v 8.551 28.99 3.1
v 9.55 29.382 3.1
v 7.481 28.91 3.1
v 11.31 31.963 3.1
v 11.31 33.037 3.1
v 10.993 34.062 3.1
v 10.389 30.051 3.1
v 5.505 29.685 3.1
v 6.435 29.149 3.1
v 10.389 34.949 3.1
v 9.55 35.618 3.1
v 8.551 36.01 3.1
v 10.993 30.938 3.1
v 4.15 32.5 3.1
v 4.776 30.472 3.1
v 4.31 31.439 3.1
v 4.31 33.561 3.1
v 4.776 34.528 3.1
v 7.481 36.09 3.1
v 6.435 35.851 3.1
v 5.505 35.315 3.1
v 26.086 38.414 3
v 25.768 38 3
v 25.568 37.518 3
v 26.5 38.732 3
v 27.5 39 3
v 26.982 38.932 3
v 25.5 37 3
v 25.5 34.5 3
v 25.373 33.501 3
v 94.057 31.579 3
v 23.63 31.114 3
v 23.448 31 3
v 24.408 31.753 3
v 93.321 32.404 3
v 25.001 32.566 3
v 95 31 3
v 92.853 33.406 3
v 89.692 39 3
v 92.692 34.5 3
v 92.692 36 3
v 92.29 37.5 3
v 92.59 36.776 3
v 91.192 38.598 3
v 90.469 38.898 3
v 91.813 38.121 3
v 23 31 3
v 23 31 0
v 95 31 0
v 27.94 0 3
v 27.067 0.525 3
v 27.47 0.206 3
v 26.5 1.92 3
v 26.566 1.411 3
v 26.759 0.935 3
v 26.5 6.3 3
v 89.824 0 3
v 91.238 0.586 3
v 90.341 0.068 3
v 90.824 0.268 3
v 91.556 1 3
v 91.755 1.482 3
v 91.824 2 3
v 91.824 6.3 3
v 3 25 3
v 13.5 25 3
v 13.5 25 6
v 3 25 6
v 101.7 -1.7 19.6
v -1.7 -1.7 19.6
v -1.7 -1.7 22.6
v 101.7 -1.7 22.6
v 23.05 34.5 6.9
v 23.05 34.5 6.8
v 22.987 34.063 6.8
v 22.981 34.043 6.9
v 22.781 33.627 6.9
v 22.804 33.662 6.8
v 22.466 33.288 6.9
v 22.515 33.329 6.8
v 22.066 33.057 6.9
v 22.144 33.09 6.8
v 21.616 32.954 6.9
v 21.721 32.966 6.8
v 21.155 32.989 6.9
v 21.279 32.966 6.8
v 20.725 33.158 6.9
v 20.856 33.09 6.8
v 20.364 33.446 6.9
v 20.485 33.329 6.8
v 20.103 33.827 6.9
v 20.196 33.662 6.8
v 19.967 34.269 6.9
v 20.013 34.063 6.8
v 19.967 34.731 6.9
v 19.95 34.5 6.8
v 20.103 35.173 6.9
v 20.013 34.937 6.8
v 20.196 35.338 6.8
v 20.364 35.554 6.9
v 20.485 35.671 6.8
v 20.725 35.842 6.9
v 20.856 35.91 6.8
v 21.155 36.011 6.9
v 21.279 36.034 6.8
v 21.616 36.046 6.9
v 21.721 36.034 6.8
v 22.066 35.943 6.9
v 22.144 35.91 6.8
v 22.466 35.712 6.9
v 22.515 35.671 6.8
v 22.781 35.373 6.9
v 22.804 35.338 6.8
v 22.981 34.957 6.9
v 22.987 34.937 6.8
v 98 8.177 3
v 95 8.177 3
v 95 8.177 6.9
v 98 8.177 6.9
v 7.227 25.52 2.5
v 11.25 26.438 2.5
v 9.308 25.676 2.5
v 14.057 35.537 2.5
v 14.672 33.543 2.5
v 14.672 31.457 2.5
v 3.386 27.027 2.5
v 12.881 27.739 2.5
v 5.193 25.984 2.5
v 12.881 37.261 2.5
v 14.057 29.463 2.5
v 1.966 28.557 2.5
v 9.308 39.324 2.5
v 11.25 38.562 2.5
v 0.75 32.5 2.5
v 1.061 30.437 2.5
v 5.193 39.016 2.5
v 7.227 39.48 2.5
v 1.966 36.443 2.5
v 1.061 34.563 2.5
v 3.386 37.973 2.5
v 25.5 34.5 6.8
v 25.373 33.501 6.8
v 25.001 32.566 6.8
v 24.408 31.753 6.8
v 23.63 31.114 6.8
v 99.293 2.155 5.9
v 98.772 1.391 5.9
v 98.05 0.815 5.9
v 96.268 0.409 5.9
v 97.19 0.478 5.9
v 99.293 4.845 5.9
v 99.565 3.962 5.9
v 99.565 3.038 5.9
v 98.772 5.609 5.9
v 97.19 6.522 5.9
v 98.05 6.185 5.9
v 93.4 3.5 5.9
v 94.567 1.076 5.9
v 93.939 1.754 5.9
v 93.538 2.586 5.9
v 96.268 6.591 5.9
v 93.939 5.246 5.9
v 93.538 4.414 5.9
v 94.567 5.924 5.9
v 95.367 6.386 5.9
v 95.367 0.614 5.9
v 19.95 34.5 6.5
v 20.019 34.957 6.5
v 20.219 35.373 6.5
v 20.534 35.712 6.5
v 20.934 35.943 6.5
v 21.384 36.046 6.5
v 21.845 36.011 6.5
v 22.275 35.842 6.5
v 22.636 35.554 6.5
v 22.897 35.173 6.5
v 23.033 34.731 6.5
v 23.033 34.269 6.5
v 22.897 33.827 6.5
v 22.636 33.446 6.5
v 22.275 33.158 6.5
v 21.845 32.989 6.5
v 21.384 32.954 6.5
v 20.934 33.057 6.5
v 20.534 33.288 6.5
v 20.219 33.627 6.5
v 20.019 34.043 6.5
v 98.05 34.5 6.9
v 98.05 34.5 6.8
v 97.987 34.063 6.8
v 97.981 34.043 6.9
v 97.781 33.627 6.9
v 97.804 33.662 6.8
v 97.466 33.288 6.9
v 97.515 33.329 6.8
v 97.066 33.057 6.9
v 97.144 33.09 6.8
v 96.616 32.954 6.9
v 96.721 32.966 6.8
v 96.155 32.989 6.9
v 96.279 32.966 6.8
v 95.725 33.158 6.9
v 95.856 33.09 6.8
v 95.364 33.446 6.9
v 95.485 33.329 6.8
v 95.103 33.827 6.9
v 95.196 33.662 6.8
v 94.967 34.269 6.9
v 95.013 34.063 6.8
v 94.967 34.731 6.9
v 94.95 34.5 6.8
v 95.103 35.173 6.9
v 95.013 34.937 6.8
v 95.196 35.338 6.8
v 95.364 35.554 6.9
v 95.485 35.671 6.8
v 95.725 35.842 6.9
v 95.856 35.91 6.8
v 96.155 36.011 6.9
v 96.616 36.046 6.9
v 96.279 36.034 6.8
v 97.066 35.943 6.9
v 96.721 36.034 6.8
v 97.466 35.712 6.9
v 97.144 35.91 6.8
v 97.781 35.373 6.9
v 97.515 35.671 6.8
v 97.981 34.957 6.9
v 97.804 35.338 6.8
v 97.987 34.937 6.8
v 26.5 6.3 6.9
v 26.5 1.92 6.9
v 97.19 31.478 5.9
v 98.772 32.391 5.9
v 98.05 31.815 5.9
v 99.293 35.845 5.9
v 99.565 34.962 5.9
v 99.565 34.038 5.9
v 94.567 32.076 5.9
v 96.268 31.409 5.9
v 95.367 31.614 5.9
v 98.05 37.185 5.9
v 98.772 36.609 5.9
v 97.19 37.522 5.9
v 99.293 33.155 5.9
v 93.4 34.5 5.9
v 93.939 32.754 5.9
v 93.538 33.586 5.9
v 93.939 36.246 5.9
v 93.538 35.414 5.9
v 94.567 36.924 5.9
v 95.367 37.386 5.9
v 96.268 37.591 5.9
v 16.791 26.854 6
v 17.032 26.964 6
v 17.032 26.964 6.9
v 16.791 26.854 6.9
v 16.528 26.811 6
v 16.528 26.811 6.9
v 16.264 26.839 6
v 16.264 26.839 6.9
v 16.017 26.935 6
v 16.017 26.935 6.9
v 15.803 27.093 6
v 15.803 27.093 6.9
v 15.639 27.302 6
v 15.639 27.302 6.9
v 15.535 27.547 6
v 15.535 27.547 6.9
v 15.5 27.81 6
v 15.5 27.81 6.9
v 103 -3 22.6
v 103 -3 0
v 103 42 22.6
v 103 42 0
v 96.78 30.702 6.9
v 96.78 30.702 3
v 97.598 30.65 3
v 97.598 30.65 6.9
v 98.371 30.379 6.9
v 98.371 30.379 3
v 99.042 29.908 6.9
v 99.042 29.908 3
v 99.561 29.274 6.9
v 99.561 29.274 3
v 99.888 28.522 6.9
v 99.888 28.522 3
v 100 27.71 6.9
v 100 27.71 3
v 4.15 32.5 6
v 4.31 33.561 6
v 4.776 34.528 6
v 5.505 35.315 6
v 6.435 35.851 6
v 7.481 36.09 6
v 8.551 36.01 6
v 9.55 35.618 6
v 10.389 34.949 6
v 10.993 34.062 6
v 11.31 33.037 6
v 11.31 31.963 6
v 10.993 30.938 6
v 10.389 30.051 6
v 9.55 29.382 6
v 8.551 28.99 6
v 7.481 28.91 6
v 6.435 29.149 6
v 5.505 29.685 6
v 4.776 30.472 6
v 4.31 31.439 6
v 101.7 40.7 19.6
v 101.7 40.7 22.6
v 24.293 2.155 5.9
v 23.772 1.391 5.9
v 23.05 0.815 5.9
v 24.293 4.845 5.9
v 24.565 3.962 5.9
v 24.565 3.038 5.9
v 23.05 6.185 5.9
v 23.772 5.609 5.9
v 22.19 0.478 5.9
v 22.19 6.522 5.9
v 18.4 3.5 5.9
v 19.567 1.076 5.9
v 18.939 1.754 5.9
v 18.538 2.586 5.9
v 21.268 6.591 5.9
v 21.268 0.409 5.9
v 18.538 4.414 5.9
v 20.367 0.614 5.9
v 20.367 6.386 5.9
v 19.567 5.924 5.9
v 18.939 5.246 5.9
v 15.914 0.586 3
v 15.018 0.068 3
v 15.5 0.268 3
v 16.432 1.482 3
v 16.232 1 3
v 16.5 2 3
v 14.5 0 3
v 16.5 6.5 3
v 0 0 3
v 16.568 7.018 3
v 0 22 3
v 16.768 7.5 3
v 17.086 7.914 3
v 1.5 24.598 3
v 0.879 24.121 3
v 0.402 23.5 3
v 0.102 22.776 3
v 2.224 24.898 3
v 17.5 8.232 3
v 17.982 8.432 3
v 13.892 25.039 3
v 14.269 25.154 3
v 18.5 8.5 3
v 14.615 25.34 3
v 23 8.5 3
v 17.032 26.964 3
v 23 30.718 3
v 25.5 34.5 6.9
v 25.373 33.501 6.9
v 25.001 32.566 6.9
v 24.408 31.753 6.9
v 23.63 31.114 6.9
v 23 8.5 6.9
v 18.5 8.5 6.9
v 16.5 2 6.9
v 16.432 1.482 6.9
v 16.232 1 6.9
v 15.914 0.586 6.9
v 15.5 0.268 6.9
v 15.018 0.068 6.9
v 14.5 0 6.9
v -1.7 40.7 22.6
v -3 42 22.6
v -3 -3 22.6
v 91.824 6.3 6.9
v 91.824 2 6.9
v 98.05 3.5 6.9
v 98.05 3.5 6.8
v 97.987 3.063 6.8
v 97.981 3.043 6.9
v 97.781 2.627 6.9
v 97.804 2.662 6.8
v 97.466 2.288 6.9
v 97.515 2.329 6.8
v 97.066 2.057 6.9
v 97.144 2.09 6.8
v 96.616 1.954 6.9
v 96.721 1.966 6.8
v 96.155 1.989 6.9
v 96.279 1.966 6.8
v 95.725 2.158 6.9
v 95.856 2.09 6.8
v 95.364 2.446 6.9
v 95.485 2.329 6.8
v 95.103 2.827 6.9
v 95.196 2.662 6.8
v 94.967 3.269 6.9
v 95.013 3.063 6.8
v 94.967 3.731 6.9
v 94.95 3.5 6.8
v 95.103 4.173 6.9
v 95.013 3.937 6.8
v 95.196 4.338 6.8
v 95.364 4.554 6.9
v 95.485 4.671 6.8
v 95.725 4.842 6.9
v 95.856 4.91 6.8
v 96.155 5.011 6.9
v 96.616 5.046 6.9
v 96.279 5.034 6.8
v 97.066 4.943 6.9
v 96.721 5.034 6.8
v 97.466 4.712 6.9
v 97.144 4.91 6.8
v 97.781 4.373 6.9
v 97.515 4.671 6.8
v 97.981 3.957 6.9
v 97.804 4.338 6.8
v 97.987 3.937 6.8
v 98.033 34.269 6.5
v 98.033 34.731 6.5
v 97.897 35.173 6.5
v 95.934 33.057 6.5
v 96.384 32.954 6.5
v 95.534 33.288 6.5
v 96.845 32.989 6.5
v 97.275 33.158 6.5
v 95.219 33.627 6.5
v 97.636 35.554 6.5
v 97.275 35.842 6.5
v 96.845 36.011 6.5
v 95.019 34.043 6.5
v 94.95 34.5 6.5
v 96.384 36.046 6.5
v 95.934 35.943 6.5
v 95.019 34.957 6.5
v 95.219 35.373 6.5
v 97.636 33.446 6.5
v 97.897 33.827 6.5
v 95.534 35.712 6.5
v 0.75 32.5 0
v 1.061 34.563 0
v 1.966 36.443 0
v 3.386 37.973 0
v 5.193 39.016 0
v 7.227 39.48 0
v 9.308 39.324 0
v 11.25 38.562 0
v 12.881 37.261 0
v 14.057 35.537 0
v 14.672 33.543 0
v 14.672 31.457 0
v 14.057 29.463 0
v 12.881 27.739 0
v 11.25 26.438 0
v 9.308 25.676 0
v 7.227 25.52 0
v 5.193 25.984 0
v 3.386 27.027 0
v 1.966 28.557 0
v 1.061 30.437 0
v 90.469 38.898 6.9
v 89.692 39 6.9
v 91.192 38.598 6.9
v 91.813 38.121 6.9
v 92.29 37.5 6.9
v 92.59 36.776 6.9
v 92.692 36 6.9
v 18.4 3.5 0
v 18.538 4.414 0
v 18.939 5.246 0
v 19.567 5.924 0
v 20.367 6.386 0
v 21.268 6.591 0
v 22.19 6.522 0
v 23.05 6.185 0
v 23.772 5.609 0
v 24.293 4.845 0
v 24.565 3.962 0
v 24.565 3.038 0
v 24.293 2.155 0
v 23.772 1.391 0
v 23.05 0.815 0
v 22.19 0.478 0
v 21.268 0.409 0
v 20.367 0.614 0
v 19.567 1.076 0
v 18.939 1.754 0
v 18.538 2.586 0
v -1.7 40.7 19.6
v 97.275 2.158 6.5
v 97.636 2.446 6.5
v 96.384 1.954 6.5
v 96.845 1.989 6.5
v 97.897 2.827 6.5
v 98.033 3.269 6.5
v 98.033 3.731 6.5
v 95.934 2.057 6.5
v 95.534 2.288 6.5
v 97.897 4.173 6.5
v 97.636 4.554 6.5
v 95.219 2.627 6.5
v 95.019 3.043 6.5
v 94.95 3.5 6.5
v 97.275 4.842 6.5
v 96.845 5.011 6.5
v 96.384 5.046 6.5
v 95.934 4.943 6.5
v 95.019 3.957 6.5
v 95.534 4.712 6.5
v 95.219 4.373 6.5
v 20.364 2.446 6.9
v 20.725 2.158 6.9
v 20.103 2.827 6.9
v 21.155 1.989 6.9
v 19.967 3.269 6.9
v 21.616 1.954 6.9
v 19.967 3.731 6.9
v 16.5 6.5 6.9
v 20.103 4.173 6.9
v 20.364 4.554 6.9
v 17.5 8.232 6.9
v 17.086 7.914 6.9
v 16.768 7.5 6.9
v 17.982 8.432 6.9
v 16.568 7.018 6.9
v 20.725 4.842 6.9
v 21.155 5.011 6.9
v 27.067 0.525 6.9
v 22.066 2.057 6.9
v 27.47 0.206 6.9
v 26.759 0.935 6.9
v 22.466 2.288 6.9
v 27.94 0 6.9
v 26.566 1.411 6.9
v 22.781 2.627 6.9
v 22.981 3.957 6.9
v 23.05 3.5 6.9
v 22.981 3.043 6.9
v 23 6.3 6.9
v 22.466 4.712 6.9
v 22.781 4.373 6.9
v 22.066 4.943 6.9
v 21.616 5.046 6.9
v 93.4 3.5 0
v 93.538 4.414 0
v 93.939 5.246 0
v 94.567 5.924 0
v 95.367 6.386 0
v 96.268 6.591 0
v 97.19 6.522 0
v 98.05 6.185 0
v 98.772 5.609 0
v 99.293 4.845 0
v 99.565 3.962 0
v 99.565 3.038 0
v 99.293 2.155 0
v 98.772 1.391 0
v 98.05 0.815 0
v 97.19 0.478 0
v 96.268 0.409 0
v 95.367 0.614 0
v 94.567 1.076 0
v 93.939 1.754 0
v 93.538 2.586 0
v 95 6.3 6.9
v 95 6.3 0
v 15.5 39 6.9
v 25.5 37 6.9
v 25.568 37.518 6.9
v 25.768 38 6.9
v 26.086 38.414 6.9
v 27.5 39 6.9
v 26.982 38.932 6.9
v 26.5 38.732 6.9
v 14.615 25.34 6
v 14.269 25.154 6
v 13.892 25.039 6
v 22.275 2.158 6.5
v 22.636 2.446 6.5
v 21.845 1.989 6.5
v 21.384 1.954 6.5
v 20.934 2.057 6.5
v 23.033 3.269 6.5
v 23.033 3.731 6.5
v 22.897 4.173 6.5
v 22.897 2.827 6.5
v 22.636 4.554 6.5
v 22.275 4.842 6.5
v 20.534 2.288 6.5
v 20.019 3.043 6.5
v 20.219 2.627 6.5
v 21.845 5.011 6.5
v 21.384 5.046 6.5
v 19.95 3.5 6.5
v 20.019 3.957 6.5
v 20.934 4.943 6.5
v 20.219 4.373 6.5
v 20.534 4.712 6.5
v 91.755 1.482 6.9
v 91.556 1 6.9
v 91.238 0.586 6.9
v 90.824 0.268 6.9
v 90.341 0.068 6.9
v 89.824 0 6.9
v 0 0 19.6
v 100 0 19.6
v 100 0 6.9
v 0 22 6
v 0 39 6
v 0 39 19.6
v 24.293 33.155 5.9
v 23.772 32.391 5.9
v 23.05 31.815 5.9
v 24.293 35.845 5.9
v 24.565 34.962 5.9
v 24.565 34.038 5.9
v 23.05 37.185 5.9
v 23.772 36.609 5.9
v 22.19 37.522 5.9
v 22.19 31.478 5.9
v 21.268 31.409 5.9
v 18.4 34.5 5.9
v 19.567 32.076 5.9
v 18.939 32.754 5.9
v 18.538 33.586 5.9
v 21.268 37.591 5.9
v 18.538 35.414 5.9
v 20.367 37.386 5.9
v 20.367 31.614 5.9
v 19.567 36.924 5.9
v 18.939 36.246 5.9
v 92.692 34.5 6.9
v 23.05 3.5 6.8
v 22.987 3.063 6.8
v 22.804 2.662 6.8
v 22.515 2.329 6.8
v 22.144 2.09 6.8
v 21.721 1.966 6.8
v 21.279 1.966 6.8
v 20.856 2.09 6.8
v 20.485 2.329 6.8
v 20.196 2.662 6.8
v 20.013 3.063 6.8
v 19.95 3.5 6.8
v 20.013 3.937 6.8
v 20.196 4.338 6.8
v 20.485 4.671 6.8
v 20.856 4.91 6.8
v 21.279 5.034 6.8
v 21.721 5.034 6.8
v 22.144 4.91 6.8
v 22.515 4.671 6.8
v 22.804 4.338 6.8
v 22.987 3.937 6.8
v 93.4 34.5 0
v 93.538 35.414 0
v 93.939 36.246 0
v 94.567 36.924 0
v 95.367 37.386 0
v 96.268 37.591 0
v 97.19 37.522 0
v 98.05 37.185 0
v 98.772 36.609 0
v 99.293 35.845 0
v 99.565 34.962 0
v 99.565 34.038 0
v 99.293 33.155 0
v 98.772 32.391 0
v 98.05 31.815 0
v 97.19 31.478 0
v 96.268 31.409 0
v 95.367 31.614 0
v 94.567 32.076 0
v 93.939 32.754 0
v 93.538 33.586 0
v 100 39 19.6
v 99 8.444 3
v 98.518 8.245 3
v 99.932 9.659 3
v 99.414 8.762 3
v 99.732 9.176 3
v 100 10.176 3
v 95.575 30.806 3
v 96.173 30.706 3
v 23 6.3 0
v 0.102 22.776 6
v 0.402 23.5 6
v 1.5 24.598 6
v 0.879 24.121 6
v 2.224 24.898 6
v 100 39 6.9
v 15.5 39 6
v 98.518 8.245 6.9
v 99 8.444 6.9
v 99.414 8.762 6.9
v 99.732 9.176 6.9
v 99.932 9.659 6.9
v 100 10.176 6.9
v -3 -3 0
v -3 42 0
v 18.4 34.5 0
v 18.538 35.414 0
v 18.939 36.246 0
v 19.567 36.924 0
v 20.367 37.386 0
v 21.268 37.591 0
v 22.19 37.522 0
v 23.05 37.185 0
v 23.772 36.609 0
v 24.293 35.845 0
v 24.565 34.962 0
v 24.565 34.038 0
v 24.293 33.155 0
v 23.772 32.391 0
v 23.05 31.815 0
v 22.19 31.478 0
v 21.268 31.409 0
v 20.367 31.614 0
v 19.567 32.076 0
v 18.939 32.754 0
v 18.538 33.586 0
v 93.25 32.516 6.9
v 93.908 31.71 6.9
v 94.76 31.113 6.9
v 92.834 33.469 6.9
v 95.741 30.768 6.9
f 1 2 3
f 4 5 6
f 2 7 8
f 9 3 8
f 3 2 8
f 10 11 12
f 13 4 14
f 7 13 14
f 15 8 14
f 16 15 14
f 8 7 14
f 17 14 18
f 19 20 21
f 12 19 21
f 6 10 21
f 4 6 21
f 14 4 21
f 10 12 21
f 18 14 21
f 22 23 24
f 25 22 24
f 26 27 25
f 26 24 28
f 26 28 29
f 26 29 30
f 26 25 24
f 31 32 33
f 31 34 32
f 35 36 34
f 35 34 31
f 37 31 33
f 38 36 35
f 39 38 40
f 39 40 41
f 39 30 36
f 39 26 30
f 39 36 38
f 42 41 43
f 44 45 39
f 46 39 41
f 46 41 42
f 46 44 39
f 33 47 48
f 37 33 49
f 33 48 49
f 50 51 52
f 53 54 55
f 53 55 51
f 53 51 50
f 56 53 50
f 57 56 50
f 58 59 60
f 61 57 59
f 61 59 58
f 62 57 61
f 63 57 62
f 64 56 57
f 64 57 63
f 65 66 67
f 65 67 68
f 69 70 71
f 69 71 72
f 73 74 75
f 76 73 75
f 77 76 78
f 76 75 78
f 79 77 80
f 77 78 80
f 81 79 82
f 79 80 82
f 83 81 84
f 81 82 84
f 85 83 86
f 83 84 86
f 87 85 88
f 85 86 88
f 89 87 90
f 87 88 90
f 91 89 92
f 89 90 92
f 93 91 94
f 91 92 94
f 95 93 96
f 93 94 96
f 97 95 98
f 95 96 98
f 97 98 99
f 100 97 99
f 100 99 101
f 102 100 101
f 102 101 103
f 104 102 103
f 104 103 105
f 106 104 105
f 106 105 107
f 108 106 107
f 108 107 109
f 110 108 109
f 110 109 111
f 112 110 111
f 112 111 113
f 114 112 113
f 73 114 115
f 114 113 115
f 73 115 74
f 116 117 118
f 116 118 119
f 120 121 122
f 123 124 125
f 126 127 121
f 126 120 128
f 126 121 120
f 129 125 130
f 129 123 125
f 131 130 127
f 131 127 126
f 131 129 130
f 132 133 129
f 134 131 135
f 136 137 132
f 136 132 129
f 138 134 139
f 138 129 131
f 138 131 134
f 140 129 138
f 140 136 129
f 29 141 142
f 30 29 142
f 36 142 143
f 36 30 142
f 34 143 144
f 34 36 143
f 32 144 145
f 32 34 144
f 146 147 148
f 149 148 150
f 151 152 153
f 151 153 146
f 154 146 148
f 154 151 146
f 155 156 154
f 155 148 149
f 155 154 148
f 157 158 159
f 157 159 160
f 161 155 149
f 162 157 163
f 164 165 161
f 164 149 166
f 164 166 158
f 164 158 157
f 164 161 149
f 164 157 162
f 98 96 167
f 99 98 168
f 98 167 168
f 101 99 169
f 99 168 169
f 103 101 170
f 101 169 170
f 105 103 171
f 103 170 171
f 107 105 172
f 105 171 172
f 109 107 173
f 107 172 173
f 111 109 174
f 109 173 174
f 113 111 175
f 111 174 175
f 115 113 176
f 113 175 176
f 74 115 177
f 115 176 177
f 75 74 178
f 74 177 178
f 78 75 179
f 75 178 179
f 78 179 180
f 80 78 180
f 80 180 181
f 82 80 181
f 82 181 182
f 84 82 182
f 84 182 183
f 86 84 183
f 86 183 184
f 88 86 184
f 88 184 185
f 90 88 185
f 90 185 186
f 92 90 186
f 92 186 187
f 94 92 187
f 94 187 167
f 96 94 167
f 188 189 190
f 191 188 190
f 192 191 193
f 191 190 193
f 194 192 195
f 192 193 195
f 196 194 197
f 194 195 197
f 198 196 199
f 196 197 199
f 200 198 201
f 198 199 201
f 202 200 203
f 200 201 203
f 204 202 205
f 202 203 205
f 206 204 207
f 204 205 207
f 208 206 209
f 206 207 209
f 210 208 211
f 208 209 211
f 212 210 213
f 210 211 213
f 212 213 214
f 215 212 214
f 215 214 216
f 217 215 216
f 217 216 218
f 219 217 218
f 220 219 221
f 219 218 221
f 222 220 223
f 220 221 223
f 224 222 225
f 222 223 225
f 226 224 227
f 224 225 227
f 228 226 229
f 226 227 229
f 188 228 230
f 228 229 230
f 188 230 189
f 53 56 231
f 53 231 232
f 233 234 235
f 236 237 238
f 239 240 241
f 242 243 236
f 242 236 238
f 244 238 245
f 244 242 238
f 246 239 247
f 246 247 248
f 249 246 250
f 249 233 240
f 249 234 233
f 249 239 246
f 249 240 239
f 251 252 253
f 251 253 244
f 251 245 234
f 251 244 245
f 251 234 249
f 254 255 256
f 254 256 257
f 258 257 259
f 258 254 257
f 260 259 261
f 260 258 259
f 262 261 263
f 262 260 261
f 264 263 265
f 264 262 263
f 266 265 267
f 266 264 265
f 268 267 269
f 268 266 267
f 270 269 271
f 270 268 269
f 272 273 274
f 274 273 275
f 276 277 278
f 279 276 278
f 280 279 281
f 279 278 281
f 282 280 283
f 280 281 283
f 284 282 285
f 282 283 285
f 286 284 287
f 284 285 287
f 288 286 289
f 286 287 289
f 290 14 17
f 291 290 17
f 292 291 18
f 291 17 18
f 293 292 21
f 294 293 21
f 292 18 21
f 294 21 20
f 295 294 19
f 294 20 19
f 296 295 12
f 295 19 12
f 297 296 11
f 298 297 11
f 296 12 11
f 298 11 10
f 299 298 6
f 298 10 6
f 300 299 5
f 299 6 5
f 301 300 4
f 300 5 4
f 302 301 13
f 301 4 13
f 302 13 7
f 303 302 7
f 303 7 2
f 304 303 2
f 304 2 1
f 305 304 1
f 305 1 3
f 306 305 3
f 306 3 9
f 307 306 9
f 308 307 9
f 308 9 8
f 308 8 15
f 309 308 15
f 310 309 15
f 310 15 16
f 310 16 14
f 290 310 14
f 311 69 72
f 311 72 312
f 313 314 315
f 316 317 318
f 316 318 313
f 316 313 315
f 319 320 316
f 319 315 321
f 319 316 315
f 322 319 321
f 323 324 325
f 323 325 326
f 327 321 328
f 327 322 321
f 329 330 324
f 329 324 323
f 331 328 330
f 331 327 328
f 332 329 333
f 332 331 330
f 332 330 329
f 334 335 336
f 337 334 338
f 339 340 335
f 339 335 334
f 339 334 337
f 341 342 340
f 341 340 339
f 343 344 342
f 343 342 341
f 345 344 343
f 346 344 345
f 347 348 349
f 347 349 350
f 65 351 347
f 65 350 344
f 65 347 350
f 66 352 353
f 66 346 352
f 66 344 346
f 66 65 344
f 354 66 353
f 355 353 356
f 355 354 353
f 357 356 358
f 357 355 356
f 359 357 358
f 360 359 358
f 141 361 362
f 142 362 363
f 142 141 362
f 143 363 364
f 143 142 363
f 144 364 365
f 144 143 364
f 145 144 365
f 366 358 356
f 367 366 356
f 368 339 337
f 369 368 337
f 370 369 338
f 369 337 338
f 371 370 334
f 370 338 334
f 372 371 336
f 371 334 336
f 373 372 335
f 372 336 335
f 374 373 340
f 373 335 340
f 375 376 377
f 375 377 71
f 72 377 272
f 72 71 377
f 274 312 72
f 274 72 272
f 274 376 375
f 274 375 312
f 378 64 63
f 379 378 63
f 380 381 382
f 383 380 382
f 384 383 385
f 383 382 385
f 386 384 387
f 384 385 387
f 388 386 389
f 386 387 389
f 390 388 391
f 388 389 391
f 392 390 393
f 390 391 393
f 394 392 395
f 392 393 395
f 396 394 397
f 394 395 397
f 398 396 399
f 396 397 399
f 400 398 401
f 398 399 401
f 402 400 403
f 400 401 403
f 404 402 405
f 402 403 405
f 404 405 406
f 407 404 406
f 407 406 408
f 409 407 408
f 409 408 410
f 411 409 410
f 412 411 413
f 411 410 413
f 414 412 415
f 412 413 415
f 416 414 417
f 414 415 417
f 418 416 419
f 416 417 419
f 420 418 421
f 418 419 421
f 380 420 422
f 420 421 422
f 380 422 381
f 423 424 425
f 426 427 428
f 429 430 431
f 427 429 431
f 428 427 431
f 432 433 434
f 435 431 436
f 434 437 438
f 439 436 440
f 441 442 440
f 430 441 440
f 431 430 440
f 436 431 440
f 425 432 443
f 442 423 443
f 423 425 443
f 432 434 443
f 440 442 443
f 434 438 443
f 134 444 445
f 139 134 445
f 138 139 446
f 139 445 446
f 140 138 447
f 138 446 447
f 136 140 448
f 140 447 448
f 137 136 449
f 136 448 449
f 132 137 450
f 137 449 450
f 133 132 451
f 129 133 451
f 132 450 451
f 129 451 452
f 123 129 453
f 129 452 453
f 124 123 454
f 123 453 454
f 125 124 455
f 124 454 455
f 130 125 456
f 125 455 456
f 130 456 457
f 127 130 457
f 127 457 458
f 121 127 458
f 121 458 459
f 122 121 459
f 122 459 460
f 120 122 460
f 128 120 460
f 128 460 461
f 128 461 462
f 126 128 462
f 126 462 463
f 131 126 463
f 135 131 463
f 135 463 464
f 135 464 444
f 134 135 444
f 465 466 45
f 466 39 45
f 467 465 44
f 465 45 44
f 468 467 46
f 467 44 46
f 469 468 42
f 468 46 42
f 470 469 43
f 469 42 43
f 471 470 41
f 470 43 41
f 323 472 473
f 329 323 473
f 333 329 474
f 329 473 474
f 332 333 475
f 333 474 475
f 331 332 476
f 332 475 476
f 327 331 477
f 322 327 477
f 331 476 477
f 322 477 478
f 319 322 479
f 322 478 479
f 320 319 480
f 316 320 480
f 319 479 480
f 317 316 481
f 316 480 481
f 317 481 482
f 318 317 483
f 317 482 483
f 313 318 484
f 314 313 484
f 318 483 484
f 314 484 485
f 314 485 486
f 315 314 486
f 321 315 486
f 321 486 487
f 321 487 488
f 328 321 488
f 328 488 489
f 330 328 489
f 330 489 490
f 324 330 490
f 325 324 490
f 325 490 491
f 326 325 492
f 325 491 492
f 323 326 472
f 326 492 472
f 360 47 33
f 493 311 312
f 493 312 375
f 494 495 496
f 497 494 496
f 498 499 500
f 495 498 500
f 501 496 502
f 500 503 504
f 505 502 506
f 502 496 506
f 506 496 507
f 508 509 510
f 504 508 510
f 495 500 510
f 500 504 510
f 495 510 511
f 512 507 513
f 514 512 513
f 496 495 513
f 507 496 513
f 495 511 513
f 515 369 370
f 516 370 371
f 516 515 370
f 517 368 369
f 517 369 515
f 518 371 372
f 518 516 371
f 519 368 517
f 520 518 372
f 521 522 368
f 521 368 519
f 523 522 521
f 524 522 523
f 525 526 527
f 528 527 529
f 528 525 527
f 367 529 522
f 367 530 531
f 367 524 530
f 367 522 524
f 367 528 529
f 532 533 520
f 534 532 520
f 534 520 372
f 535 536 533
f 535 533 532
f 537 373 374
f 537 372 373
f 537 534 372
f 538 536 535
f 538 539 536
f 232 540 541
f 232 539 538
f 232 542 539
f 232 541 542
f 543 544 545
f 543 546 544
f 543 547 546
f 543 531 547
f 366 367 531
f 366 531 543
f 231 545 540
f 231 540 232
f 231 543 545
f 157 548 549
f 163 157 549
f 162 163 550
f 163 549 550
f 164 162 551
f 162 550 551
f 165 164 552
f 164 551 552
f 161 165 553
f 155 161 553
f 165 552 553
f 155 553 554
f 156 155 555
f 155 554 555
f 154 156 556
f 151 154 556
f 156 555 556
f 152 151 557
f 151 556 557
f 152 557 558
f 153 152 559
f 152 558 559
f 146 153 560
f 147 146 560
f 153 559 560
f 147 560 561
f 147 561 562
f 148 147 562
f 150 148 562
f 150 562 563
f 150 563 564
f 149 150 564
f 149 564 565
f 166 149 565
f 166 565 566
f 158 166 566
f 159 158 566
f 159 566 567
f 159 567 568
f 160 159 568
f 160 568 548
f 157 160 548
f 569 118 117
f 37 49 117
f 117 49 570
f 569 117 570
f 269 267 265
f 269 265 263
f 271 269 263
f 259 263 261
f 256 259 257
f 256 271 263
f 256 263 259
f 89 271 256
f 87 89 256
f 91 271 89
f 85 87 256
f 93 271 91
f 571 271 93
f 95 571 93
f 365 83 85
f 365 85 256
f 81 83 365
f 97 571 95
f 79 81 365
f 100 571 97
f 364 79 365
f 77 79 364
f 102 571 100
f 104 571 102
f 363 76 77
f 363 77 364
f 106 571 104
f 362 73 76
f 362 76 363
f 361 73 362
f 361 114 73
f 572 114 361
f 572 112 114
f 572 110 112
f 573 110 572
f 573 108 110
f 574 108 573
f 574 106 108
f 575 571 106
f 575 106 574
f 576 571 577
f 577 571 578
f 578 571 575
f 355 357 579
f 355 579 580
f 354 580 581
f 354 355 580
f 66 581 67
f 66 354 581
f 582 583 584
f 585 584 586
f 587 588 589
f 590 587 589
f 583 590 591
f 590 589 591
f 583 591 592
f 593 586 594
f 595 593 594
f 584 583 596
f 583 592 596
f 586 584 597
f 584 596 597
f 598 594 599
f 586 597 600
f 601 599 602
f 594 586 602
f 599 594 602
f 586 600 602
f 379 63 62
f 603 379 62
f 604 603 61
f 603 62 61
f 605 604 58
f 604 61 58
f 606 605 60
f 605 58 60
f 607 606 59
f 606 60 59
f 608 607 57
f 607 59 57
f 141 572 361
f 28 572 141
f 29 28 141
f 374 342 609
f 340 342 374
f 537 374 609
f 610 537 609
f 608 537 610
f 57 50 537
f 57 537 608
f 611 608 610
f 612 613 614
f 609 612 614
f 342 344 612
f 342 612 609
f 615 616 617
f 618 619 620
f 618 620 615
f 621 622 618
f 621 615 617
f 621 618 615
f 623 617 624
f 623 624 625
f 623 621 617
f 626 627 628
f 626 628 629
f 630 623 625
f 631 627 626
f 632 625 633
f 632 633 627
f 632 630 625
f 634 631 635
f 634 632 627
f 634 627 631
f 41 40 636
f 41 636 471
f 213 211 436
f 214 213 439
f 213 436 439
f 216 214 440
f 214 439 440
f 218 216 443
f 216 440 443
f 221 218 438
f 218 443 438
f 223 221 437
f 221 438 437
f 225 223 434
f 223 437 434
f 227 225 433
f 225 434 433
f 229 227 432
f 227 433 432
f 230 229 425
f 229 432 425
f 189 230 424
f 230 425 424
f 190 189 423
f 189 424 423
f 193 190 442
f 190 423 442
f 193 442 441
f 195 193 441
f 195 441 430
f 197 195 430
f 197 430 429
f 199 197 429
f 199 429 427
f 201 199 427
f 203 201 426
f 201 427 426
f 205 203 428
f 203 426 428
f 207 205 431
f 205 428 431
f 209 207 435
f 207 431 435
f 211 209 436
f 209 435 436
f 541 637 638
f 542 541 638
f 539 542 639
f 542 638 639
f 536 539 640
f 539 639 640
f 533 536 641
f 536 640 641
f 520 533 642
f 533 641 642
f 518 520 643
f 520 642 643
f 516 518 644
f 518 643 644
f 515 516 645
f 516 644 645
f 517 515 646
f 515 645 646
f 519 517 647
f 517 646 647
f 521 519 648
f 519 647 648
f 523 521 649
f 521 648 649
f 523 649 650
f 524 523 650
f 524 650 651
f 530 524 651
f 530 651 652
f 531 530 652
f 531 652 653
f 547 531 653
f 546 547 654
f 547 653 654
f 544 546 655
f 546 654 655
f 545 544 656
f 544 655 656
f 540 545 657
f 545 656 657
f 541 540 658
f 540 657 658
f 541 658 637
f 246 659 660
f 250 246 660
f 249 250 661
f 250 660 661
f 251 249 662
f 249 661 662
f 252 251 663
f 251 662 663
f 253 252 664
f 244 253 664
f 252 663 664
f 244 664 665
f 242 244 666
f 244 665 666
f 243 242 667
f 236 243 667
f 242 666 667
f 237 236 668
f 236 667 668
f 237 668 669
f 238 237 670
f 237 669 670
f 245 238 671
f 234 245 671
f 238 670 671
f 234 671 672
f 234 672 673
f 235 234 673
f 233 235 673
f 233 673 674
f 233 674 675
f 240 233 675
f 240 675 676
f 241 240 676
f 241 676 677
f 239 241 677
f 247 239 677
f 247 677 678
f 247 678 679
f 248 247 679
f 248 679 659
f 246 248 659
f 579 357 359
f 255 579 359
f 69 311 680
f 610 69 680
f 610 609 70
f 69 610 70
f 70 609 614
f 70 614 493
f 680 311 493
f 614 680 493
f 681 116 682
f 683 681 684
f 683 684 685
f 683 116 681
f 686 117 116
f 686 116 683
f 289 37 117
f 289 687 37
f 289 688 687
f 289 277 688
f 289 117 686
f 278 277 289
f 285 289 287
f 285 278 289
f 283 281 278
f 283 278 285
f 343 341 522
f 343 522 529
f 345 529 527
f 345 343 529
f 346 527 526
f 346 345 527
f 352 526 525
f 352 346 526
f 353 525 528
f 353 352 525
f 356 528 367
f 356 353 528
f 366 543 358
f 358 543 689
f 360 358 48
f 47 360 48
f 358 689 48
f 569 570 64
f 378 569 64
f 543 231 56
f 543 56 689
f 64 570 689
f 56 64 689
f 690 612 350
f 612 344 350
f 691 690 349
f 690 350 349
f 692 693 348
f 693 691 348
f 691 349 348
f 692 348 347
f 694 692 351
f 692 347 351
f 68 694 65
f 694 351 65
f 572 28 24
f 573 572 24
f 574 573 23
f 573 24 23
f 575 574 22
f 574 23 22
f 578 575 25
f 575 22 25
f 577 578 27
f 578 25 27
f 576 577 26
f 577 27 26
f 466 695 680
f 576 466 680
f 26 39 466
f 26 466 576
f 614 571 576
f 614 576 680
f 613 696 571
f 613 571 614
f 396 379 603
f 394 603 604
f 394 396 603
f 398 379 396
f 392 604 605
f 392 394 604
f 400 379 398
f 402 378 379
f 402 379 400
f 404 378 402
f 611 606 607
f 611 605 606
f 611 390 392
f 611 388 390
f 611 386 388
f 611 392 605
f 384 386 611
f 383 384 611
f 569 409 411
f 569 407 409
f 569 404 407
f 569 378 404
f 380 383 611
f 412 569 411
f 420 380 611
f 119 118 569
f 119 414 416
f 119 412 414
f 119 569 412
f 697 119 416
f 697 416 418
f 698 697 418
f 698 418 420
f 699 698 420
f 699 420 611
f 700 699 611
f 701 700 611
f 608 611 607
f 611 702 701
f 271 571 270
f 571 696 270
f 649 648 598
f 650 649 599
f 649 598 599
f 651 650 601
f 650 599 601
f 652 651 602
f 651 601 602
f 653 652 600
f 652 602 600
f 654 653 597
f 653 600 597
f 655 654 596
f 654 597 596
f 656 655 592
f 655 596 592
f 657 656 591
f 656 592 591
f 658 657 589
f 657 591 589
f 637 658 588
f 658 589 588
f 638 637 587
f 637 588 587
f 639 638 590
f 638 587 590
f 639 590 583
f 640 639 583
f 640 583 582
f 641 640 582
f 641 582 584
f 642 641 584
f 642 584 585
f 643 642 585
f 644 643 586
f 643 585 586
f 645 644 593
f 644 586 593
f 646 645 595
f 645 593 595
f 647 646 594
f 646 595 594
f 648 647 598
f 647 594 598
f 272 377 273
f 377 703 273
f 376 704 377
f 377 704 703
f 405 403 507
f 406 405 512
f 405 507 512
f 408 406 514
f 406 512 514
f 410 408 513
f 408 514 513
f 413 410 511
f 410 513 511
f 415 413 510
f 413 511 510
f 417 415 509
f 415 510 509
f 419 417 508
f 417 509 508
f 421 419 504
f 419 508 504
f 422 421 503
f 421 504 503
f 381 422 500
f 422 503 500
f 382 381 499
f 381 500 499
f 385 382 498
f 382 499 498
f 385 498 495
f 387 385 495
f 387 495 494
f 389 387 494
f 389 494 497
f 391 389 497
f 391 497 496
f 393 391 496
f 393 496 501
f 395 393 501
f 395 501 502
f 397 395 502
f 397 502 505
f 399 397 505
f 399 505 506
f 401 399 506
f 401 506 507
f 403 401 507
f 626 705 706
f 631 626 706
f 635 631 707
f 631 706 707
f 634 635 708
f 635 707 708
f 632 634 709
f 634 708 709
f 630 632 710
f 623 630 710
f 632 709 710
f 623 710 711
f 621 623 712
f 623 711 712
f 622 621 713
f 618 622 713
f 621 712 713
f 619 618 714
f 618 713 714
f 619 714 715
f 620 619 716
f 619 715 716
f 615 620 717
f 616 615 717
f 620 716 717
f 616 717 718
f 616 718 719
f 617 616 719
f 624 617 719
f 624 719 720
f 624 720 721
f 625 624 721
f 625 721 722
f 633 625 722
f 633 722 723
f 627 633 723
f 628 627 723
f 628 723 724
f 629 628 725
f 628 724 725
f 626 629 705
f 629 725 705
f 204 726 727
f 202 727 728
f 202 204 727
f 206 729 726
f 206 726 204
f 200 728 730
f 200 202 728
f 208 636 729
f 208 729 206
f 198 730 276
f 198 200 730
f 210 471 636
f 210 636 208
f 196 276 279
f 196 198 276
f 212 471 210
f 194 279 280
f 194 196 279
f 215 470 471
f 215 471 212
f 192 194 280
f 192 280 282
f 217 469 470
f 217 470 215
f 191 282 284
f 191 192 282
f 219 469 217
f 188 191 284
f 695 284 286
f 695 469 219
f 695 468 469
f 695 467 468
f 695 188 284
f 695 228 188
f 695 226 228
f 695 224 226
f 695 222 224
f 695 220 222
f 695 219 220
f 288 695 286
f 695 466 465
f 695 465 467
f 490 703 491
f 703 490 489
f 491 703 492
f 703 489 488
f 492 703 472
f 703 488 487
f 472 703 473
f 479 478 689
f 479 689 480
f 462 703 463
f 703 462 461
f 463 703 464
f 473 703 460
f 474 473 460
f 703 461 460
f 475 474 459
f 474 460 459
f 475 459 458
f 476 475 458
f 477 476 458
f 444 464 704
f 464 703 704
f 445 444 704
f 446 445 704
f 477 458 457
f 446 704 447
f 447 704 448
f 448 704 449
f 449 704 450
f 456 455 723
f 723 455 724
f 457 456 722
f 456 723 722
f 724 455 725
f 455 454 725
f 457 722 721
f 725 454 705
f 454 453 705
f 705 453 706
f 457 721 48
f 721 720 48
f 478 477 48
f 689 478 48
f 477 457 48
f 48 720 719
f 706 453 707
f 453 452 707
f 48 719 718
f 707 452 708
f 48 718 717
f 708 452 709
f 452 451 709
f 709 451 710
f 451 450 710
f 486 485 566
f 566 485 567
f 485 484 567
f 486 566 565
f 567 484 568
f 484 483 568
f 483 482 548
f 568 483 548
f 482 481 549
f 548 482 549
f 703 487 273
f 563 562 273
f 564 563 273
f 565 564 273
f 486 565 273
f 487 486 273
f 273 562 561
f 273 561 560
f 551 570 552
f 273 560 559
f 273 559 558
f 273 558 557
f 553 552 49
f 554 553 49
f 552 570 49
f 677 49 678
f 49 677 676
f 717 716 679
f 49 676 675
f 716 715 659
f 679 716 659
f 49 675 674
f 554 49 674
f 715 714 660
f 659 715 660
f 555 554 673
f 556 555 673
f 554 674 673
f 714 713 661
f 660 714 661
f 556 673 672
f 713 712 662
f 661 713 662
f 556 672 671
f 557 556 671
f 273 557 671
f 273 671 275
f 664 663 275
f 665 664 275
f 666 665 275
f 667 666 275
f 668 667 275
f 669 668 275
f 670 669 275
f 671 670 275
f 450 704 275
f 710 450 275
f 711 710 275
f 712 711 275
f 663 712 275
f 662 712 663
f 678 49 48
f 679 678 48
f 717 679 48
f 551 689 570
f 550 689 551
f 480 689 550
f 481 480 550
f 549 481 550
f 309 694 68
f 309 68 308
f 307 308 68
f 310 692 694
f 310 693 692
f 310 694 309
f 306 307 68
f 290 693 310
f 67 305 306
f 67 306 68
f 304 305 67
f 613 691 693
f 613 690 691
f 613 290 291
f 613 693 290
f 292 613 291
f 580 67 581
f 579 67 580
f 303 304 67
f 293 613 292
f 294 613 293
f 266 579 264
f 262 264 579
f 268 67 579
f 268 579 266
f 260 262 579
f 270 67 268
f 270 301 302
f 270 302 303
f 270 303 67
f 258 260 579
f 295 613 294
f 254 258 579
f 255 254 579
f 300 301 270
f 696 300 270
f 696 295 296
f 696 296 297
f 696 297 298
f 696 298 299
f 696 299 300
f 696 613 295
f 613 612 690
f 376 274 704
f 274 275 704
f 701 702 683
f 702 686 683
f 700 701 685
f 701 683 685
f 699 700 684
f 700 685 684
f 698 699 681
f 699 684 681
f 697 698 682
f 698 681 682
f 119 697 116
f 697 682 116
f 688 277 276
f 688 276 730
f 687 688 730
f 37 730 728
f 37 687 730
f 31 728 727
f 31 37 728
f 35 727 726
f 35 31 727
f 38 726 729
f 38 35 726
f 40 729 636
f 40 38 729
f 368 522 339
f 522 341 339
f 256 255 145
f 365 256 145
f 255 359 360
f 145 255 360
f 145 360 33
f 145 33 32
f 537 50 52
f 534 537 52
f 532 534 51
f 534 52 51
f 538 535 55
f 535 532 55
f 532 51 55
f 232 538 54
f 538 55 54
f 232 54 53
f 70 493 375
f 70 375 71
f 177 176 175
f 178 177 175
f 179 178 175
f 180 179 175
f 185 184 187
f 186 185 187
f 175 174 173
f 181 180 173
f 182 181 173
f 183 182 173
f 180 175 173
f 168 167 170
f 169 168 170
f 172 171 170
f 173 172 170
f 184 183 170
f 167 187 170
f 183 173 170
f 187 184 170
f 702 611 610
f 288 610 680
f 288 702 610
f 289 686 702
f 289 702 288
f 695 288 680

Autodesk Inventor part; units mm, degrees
ref_plane "YZ Plane" through (0, 0, 0) normal (1, 0, 0) x (0, 1, 0)
ref_plane "XZ Plane" through (0, 0, 0) normal (0, 1, 0) x (-1, 0, 0)
ref_plane "XY Plane" through (0, 0, 0) normal (0, 0, 1) x (1, 0, 0)
sketch "Sketch1" plane through (0, 0, 0) normal (0, 0, 1) x (1, 0, 0)
  line L0 (0, 0) -> (100, 0)
  line L1 (100, 0) -> (100, 39)
  line L2 (100, 39) -> (0, 39)
  line L3 (0, 39) -> (0, 0)
  dimension "d45" = 100
  dimension "d46" = 39
extrude "bottom" add sketch "Sketch1" along normal blind 3
sketch "Sketch5" plane through (0, 0, 0) normal (0, 0, -1) x (-1, 0, 0)
  line L0 (0, 0) -> (-100, 0) projected
  line L1 (0, 39) -> (0, 0) projected
  line L2 (-100, 39) -> (0, 39) projected
  line L3 (-100, 0) -> (-100, 39) projected
  line L4 (3, 42) -> (3, -3)
  line L5 (3, -3) -> (-103, -3)
  line L6 (-103, -3) -> (-103, 42)
  line L7 (-103, 42) -> (3, 42)
  dimension "d30" = 3
extrude "walls" add sketch "Sketch5" against normal blind 19.6
sketch "holes" plane through (0, 0, 0) normal (0, 0, 1) x (1, 0, 0)
  line L0 (0, 0) -> (100, 0) projected
  line L1 (100, 0) -> (100, 39) projected
  line L2 (100, 39) -> (0, 39) projected
  line L3 (0, 39) -> (0, 0) projected
  circle A0 centre (21.5, 34.5) radius 1.55 construction
  circle A1 centre (96.5, 34.5) radius 1.55 construction
  circle A2 centre (96.5, 3.5) radius 1.55 construction
  circle A3 centre (21.5, 3.5) radius 1.55 construction
  line L4 (21.5, 34.5) -> (21.5, 3.5) construction
  line L5 (21.5, 3.5) -> (96.5, 3.5) construction
  line L6 (96.5, 3.5) -> (96.5, 34.5) construction
  line L7 (96.5, 34.5) -> (21.5, 34.5) construction
  dimension "d33" = 3.1
  dimension "d34" = 75
  dimension "d35" = 31
  dimension "d50" = 3.5
  dimension "d51" = 3.5
sketch "Sketch8" plane through (0, 0, 0) normal (0, 0, -1) x (-1, 0, 0)
  line L0 (-95, 6.3) -> (-23, 6.3)
  line L1 (-23, 6.3) -> (-23, 31)
  line L2 (-23, 31) -> (-95, 31)
  line L3 (-95, 31) -> (-95, 6.3)
  line L4 (3, -3) -> (-103, -3) projected
  line L5 (-96.5, 3.5) -> (-96.5, 34.5) construction
  line L6 (-21.5, 34.5) -> (-21.5, 3.5) construction
  point P0 (0, 0)
  dimension "d99" = 1.5
  dimension "d100" = 1.5
  dimension "d101" = 3.5
  dimension "d102" = 2.8
extrude "display" cut sketch "Sketch8" along normal through all both and the other way through all
sketch "Sketch7" plane through (0, 0, 3) normal (0, 0, 1) x (1, 0, 0)
  circle A0 centre (96.5, 34.5) radius 1.55 construction
  circle A1 centre (21.5, 3.5) radius 1.55 construction
  circle A2 centre (21.5, 34.5) radius 1.55 construction
  arc A3 (23.4365, 31) -> (25.5, 34.5) centre (21.5, 34.5) ccw
  line L0 (15.5, 39) -> (27.5, 39)
  line L1 (0, 39) -> (100, 39) projected
  arc A4 (27.5, 39) -> (25.5, 37) centre (27.5, 37) ccw
  line L2 (25.5, 37) -> (25.5, 34.5)
  line L3 (16.3235, 0) -> (26.6765, 0)
  line L4 (23, 31) -> (95, 31) construction
  arc A5 (92.6921, 34.5) -> (96.7797, 30.7024) centre (96.5, 34.5) ccw
  line L5 (92.6921, 34.5) -> (92.6921, 36)
  arc A6 (92.6921, 36) -> (89.6921, 39) centre (89.6921, 36) ccw
  line L6 (100, 0) -> (100, 39) projected
  arc A7 (100, 27.7105) -> (96.7797, 30.7024) centre (97, 27.7105) ccw
  line L7 (100, 39) -> (0, 39) projected
  line L8 (89.6921, 39) -> (100, 39)
  line L9 (100, 39) -> (100, 27.7105)
  circle A8 centre (96.5, 3.5) radius 3.1765 construction
  line L10 (0, 0) -> (100, 0) projected
  arc A9 (90.3438, 0) -> (93.3339, 3.2429) centre (90.3438, 3) ccw construction
  arc A10 (96.7571, 6.6661) -> (100, 9.6562) centre (97, 9.6562) ccw construction
  line L11 (100, 9.6562) -> (100, 0)
  line L12 (100, 0) -> (90.3438, 0)
  line L13 (15.5, 39) -> (15.5, 27.8105)
  line L14 (17.0325, 26.964) -> (23.6299, 31.1142)
  line L15 (0, 0) -> (0, 39) projected
  arc A11 (15.5, 27.8105) -> (17.0325, 26.964) centre (16.5, 27.8105) ccw
  line L16 (100, 0) -> (0, 0) projected
  line L17 (96.5, 6.6765) -> (95, 6.6765) construction
  line L18 (95, 6.6765) -> (95, 6.3)
  line L19 (23, 6.3) -> (95, 6.3) projected
  line L20 (95, 6.3) -> (93.3235, 6.3)
  line L21 (93.3235, 6.3) -> (93.3235, 3.5) construction
  line L22 (91.8235, 6.3) -> (91.8235, 2)
  arc A12 (89.8235, 0) -> (91.8235, 2) centre (89.8235, 2) ccw
  line L23 (95, 8.1765) -> (98, 8.1765)
  arc A13 (98, 8.1765) -> (100, 10.1765) centre (98, 10.1765) ccw
  line L24 (100, 39) -> (100, 0) projected
  line L25 (95, 6.6765) -> (95, 8.1765)
  line L26 (95, 6.3) -> (95, 31) construction
  line L27 (95, 6.3) -> (23, 6.3) construction
  line L28 (26.5, 6.3) -> (26.5, 1.9199)
  arc A14 (26.5, 1.9199) -> (27.9398, 0) centre (28.5, 1.9199) ccw
  line L29 (23, 8.5) -> (18.5, 8.5)
  arc A15 (18.5, 8.5) -> (16.5, 6.5) centre (18.5, 6.5) ccw
  line L30 (16.5, 6.5) -> (16.5, 2)
  arc A16 (14.5, 0) -> (16.5, 2) centre (14.5, 2) ccw
  line L31 (23, 31) -> (23, 6.3) projected
  line L32 (23, 8.5) -> (23, 6.3)
  line L33 (23, 6.3) -> (26.5, 6.3)
  point P0 (15.5, 26)
  dimension "d54" = 8
  dimension "d61" = 3
  dimension "d62" = 3
  dimension "d65" = 3
  dimension "d66" = 3
  dimension "d81" = 15.5
  dimension "d82" = 13
  dimension "d83" = 1
  dimension "d103" = 1.5
  dimension "d104" = 1.5
  dimension "d105" = 2
  dimension "d106" = 2
  dimension "d117" = 2
  dimension "d118" = 5
  dimension "d119" = 5
  dimension "d120" = 2
  dimension "d121" = 2
  dimension "d122" = 2
  dimension "d123" = 5
extrude "Extrusion19" add sketch "Sketch7" along normal blind 3.8 contours L14 A11 L13 L0 A4 L2 A3 | L31 L19 L28 A14 L10 L3 A16 L30 A15 L29 | L1 L6 A7 A5 L5 A6 | L19 L18 L25 L23 A13 L6 L10 A12 L22
sketch "Sketch9" plane through (0, 0, 0) normal (0, 0, -1) x (-1, 0, 0)
  circle A0 centre (-21.5, 3.5) radius 1.55 construction
  circle A1 centre (-21.5, 34.5) radius 1.55 construction
  circle A2 centre (-21.5, 34.5) radius 3.1
  circle A3 centre (-21.5, 3.5) radius 3.1
  circle A4 centre (-96.5, 34.5) radius 1.55 construction
  circle A5 centre (-96.5, 3.5) radius 1.55 construction
  circle A6 centre (-96.5, 34.5) radius 3.1
  circle A7 centre (-96.5, 3.5) radius 3.1
  line L0 (-95, 6.3) -> (-95, 31) projected
  point P0 (0, 0)
  point P1 (-94.7478, 6.0573)
  point P2 (-95.3418, 6.3755)
  dimension "d57" = 6.2
  dimension "d58" = 6.2
  dimension "d109" = 6.2
extrude "bolt holes" cut sketch "Sketch9" against normal blind 6.5
sketch "Sketch10" plane through (0, 0, 0) normal (0, 0, -1) x (-1, 0, 0)
  circle A0 centre (-96.5, 34.5) radius 1.55 projected
  circle A1 centre (-96.5, 3.5) radius 1.55 projected
  circle A2 centre (-21.5, 3.5) radius 1.55 projected
  circle A3 centre (-21.5, 34.5) radius 1.55 projected
  point P0 (0, 0)
extrude "holes screws" cut sketch "Sketch10" along normal through all both and the other way through all
sketch "Sketch11" plane through (96.5, 34.5, 6.5) normal (0, 0, -1) x (-1, 0, 0)
  circle A0 centre (75, 0) radius 1.55 projected
  circle A1 centre (75, 0) radius 3.1 projected
  circle A2 centre (75, -31) radius 3.1 projected
  circle A3 centre (0, -31) radius 1.55 projected
  circle A4 centre (0, -31) radius 3.1 projected
  circle A5 centre (0, 0) radius 3.1 projected
  point P0 (96.5, -34.5)
extrude "fill after hole" add sketch "Sketch11" along normal blind 0.6 contours A0 | A1 | A2 | A3 | A4 | A5
sketch "Sketch13" plane through (0, 0, 19.6) normal (0, 0, 1) x (1, 0, 0)
  line L0 (0, 0) -> (0, 39) projected
  line L1 (0, 39) -> (100, 39) projected
  line L2 (100, 39) -> (100, 0) projected
  line L3 (100, 0) -> (0, 0) projected
  line L4 (-3, 42) -> (-3, -3) projected
  line L5 (-3, -3) -> (103, -3) projected
  line L6 (103, -3) -> (103, 42) projected
  line L7 (103, 42) -> (-3, 42) projected
  line L8 (-1.7, 40.7) -> (-1.7, -1.7)
  line L9 (-1.7, -1.7) -> (101.7, -1.7)
  line L10 (101.7, -1.7) -> (101.7, 40.7)
  line L11 (101.7, 40.7) -> (-1.7, 40.7)
  dimension "d126" = 1.3
  dimension "d127" = 1.3
  dimension "d128" = 1.3
  dimension "d129" = 1.3
extrude "collar" add sketch "Sketch13" along normal blind 3 contours L7 L6 L5 L4
sketch "Sketch15" plane through (0, 0, 3) normal (0, 0, 1) x (1, 0, 0)
  line L0 (100, 39) -> (0, 39) projected
  line L1 (0, 39) -> (15.5, 39)
  line L2 (15.5, 39) -> (15.5, 27)
  line L3 (13.5, 25) -> (0, 25)
  line L4 (0, 25) -> (0, 39)
  line L5 (0, 0) -> (0, 39) projected
  arc A0 (3, 25) -> (0, 22) centre (3, 22) ccw
  line L6 (0, 25) -> (0, 22)
  arc A1 (13.5, 25) -> (15.5, 27) centre (13.5, 27) ccw
  line L7 (14.6154, 25.3399) -> (17.0325, 26.964)
  arc A2 (15.5, 27.8105) -> (17.0325, 26.964) centre (16.5, 27.8105) ccw projected
  point P0 (15.5, 39)
  point P1 (15.5, 25)
  dimension "d90" = 14
  dimension "d95" = 3
  dimension "d96" = 2
extrude "encoder standoff" add sketch "Sketch15" along normal blind 3
sketch "Sketch12" plane through (0, 0, 0) normal (0, 0, -1) x (-1, 0, 0)
  circle A0 centre (-7.75, 32.5) radius 3.6
  line L0 (0, 0) -> (0, 39) projected
  line L1 (-7.75, 32.5) -> (-15.5, 32.5) construction
  line L2 (-7.75, 32.5) -> (0, 32.5) construction
  line L3 (0, 39) -> (-100, 39) construction
  line L4 (0, 22) -> (0, 0) projected
  line L5 (-89.6921, 39) -> (-27.5, 39) projected
  line L6 (0, 22) -> (0, 39) projected
  line L7 (0, 39) -> (-15.5, 39) projected
  line L8 (-15.5, 39) -> (-15.5, 27.8105) projected
  line L9 (-15.5, 39) -> (-27.5, 39) projected
  line L10 (-89.6921, 39) -> (-100, 39) projected
  point P0 (-15.5, 39)
  dimension "d71" = 7.2
  dimension "d112" = 6.5
extrude "encoder hole" cut sketch "Sketch12" along normal through all both and the other way through all
sketch "Sketch14" plane through (0, 0, 0) normal (0, 0, -1) x (-1, 0, 0)
  circle A0 centre (-7.75, 32.5) radius 3.6 projected
  circle A1 centre (-7.75, 32.5) radius 7
  point P0 (0, 0)
  dimension "d87" = 14
extrude "encoder nut" cut sketch "Sketch14" against normal blind 2.5
sketch "Sketch16" plane through (7.75, 32.5, 2.5) normal (0, 0, -1) x (-1, 0, 0)
  circle A0 centre (0, 0) radius 3.6 projected
  point P0 (7.75, -32.5)
extrude "encoder fill before hole" add sketch "Sketch16" against normal blind 0.6
sketch "Sketch18" plane through (0, 0, 6.8) normal (0, 0, 1) x (1, 0, 0)
  circle A0 centre (21.5, 34.5) radius 1.55 projected
  line L0 (15.5, 39) -> (15.5, 27.8105) projected
  arc A1 (15.5, 27.8105) -> (17.0325, 26.964) centre (16.5, 27.8105) ccw projected
  line L1 (17.0325, 26.964) -> (23.6299, 31.1142) projected
  arc A2 (23.6299, 31.1142) -> (25.5, 34.5) centre (21.5, 34.5) ccw projected
  line L2 (25.5, 34.5) -> (25.5, 37) projected
  arc A3 (27.5, 39) -> (25.5, 37) centre (27.5, 37) ccw projected
  line L3 (15.5, 39) -> (27.5, 39) projected
  circle A4 centre (21.5, 3.5) radius 1.55 projected
  arc A5 (14.5, 0) -> (16.5, 2) centre (14.5, 2) ccw projected
  line L4 (27.9398, 0) -> (14.5, 0) projected
  arc A6 (26.5, 1.9199) -> (27.9398, 0) centre (28.5, 1.9199) ccw projected
  line L5 (26.5, 6.3) -> (26.5, 1.9199) projected
  line L6 (23, 6.3) -> (26.5, 6.3) projected
  line L7 (23, 8.5) -> (23, 6.3) projected
  line L8 (18.5, 8.5) -> (23, 8.5) projected
  arc A7 (18.5, 8.5) -> (16.5, 6.5) centre (18.5, 6.5) ccw projected
  line L9 (16.5, 2) -> (16.5, 6.5) projected
  circle A8 centre (96.5, 3.5) radius 1.55 projected
  line L10 (100, 0) -> (89.8235, 0) projected
  line L11 (100, 10.1765) -> (100, 0) projected
  arc A9 (98, 8.1765) -> (100, 10.1765) centre (98, 10.1765) ccw projected
  line L12 (95, 8.1765) -> (98, 8.1765) projected
  line L13 (95, 6.3) -> (95, 8.1765) projected
  line L14 (91.8235, 6.3) -> (95, 6.3) projected
  line L15 (91.8235, 2) -> (91.8235, 6.3) projected
  arc A10 (89.8235, 0) -> (91.8235, 2) centre (89.8235, 2) ccw projected
  circle A11 centre (96.5, 34.5) radius 1.55 projected
  arc A12 (92.6921, 36) -> (89.6921, 39) centre (89.6921, 36) ccw projected
  line L16 (92.6921, 34.5) -> (92.6921, 36) projected
  arc A13 (92.6921, 34.5) -> (96.7797, 30.7024) centre (96.5, 34.5) ccw projected
  arc A14 (100, 27.7105) -> (96.7797, 30.7024) centre (97, 27.7105) ccw projected
  line L17 (100, 39) -> (100, 27.7105) projected
  line L18 (89.6921, 39) -> (100, 39) projected
  point P0 (0, 0)
extrude "Extrusion21" add sketch "Sketch18" along normal blind 0.1
properties part number "top"
